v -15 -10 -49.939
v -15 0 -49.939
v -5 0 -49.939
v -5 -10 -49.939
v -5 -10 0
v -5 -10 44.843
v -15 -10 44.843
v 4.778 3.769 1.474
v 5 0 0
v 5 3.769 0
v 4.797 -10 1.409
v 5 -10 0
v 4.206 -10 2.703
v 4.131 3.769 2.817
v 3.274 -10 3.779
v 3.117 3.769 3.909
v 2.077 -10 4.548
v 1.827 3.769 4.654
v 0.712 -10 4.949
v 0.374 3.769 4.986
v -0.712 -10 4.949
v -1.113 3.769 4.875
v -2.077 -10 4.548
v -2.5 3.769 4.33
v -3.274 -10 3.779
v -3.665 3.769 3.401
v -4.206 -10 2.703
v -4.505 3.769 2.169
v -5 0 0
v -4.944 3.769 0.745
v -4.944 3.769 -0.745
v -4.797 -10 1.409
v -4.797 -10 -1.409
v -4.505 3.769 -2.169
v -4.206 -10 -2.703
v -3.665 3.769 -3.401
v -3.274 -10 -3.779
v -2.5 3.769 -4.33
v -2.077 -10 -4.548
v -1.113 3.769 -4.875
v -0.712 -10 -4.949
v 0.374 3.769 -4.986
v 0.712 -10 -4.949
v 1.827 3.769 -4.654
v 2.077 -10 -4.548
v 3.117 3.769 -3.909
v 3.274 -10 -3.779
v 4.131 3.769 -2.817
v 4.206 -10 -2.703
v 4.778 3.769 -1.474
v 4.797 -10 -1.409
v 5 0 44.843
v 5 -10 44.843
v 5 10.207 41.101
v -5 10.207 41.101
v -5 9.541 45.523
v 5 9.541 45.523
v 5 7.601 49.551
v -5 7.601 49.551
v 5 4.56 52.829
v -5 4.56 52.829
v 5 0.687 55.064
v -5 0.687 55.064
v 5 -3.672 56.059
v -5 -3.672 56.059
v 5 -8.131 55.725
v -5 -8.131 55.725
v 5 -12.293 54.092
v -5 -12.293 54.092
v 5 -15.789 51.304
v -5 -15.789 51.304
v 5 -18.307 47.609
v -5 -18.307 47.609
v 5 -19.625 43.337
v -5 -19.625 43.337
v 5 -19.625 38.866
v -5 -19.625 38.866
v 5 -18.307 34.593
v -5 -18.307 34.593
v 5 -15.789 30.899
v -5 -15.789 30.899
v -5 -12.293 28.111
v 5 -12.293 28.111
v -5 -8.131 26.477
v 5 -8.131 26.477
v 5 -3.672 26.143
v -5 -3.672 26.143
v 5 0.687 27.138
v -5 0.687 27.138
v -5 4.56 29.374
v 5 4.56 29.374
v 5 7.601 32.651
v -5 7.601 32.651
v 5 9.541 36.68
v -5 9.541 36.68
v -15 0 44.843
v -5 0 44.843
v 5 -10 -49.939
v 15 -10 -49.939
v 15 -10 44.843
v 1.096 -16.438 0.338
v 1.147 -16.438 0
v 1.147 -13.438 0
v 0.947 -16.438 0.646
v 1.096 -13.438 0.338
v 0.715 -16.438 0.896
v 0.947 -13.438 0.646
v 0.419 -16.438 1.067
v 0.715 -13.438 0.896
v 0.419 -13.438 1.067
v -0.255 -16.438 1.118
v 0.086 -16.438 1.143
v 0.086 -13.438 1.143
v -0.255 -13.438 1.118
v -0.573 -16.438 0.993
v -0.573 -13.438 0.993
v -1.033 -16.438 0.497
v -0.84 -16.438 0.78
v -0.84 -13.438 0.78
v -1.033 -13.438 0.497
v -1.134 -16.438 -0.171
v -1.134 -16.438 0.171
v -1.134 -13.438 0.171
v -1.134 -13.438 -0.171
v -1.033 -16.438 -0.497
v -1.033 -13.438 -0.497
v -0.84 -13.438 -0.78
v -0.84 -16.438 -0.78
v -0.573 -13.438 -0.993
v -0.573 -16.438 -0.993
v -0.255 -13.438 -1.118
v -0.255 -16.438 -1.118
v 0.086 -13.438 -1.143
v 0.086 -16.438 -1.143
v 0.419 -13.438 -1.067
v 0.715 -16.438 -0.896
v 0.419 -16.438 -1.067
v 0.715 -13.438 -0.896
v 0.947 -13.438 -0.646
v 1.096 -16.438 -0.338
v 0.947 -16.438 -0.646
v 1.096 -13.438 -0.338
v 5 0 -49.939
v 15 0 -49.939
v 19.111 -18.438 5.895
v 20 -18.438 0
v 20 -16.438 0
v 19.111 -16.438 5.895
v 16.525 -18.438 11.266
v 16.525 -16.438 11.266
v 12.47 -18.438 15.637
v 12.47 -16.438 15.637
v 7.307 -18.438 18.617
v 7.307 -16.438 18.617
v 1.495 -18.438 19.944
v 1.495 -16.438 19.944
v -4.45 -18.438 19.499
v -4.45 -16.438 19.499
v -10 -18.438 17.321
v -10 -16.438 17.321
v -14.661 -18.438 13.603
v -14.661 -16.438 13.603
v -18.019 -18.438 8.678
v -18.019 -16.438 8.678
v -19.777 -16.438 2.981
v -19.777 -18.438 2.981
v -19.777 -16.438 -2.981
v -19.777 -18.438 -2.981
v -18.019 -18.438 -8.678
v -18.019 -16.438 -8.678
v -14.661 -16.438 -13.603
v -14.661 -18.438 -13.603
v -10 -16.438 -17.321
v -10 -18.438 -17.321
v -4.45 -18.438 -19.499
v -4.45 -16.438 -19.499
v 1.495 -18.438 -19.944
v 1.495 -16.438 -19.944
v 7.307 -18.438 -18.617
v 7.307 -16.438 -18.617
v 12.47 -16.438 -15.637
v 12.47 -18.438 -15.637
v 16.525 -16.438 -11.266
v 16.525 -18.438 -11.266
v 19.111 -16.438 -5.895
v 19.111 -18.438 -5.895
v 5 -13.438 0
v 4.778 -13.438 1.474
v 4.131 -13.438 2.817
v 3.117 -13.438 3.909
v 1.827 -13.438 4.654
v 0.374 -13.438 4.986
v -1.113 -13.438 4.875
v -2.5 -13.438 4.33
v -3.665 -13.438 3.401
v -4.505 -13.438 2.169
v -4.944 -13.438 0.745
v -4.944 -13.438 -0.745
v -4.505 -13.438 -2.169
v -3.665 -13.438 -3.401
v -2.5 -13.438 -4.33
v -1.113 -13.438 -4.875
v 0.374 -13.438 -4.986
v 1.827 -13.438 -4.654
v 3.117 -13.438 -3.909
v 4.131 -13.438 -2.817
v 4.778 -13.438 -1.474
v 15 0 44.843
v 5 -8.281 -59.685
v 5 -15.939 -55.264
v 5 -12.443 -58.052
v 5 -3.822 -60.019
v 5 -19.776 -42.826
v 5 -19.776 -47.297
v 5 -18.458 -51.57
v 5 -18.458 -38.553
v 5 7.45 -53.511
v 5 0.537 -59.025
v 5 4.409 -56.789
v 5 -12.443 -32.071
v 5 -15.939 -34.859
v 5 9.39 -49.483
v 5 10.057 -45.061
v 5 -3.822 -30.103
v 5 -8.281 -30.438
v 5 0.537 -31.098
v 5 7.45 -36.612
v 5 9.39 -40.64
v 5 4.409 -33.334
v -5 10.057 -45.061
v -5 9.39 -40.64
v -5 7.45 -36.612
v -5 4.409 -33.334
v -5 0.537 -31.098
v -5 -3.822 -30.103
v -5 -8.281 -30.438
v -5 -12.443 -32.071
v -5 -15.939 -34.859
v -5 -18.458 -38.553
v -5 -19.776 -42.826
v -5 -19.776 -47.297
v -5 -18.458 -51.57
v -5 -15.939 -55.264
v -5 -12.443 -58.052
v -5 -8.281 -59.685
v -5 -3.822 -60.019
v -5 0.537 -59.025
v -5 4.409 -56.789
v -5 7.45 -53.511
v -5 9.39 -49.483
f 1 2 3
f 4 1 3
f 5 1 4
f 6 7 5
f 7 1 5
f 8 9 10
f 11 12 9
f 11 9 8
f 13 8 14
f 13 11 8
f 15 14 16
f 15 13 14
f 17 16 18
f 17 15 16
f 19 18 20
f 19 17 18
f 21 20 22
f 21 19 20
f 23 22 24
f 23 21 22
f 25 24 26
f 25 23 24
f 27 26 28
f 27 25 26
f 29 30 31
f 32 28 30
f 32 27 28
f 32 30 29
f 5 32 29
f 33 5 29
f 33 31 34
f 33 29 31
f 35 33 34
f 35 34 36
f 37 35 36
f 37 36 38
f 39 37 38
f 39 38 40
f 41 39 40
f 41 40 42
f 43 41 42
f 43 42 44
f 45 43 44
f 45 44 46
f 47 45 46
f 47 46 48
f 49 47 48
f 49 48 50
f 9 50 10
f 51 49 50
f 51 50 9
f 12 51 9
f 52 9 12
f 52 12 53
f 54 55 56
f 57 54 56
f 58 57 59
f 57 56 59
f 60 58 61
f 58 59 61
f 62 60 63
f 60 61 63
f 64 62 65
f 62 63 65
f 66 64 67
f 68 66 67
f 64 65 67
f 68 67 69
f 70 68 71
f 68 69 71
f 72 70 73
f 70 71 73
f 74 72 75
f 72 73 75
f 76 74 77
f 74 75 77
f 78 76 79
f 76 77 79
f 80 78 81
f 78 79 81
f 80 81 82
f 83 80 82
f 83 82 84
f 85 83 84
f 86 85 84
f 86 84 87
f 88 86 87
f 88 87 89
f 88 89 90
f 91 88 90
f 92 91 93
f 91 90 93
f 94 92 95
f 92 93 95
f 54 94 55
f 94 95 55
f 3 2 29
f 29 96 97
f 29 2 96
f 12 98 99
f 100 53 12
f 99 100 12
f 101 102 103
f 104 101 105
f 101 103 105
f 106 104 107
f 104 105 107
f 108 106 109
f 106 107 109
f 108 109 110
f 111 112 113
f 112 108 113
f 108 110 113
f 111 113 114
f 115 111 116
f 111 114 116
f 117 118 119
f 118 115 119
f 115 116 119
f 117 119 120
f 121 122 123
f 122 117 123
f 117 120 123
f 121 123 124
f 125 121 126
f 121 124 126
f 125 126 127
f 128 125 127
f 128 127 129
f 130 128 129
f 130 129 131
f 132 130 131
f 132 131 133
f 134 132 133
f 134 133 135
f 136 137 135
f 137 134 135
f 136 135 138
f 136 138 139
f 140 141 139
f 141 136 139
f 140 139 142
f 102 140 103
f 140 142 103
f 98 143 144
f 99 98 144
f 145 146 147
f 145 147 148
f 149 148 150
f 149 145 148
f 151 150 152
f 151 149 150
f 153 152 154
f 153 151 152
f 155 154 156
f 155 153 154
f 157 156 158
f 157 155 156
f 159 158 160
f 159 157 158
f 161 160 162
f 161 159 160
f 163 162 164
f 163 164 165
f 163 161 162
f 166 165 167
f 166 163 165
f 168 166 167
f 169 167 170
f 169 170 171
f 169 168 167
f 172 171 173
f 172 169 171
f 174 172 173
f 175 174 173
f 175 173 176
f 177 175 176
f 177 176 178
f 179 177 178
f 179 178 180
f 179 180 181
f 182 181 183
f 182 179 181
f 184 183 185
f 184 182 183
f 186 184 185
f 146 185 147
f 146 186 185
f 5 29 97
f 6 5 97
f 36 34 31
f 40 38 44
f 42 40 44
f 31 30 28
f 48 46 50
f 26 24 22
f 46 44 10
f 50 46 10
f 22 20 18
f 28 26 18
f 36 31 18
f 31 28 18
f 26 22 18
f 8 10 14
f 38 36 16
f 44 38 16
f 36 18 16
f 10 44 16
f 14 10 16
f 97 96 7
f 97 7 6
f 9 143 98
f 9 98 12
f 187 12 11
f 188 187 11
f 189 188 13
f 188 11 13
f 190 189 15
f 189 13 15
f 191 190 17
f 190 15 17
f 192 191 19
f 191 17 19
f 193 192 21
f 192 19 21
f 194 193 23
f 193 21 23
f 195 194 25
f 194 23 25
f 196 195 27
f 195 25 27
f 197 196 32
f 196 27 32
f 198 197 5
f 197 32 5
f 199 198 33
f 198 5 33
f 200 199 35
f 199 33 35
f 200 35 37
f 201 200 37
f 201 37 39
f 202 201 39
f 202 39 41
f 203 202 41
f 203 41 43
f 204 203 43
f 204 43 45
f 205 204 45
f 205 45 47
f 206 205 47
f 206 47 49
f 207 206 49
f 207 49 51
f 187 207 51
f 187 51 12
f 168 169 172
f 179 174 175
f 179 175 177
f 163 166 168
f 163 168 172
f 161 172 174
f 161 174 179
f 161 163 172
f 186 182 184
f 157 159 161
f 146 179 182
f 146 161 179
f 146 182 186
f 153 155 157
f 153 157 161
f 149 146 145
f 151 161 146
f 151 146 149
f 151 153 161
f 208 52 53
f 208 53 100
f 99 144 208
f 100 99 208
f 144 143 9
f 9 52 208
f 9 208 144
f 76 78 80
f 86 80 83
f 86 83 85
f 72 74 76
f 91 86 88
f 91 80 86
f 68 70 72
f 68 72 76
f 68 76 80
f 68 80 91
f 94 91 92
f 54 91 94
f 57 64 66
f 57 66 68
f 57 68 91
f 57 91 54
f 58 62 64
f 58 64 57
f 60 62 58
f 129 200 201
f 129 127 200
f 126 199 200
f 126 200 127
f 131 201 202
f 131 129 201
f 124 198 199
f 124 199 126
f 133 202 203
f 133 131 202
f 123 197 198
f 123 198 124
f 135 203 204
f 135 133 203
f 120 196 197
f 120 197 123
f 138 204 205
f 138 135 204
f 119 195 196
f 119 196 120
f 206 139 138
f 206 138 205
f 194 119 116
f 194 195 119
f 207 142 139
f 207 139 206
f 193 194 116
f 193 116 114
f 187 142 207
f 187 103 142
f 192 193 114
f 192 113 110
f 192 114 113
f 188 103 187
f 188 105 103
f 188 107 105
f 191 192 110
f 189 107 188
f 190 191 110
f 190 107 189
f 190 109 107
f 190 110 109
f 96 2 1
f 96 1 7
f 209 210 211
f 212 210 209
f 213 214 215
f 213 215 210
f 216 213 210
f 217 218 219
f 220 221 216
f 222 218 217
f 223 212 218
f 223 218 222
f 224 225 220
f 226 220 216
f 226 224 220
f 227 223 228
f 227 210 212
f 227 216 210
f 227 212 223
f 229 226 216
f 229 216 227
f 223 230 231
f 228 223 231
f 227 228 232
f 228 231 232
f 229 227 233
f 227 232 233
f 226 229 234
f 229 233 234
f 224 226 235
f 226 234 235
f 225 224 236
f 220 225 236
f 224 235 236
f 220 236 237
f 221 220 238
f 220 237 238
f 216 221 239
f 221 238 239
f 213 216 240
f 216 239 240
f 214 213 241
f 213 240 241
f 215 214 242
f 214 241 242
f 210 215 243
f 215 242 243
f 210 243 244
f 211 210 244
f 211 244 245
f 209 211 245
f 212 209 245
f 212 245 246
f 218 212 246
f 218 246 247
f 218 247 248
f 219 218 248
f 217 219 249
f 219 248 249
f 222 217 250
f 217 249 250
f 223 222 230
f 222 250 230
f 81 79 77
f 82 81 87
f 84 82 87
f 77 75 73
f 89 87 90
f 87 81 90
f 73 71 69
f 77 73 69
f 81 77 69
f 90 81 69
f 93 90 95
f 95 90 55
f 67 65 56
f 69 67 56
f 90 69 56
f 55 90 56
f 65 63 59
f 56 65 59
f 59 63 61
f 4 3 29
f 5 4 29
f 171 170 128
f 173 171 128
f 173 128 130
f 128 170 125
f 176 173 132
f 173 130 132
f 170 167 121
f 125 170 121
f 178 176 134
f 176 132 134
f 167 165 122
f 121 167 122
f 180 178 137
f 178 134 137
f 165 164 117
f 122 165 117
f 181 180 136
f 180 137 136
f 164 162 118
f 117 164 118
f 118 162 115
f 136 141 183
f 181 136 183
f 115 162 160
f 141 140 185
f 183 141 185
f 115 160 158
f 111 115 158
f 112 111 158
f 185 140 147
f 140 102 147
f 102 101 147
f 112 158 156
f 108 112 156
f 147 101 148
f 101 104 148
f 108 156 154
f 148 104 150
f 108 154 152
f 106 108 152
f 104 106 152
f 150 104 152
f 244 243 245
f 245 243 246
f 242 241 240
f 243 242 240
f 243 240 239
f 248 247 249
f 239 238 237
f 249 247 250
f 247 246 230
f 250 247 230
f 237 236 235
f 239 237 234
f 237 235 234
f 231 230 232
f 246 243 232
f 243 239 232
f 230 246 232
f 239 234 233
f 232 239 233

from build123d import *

# Parameters (mm, degrees)
F0_W      = 10
F0_H      = 94.782337
F1_DEPTH  = 10
F2_R      = 15
F3_DEPTH  = 10
F4_R      = 5
F5_DEPTH  = 13.768665
F5_FACE_R = 5
F6_DEPTH  = 3.437768
F7_R      = 1.146529
F8_DEPTH  = 5
F9_R      = 20
F10_DEPTH = 2


with BuildPart() as f1:
    # F0 (on Front) → F1 (new body)
    with BuildSketch(Plane.XZ):
        with Locations((10, -2.548195)):
            Rectangle(F0_W, F0_H)
        with Locations((-10, -2.548195)):
            Rectangle(F0_W, F0_H)
    extrude(amount=F1_DEPTH)



with BuildPart() as f3:
    # F2 (on face) → F3 (new body)
    with BuildSketch(Plane.YZ.offset(-5)):
        with Locations((-4.94337, -45.061424)):
            Circle(F2_R)
        with Locations((-4.792805, 41.101221)):
            Circle(F2_R)
    extrude(amount=F3_DEPTH)


with BuildPart() as f5:
    # F4 (on face) → F5 (new body)
    with BuildSketch(Plane.XZ.offset(10)):
        Circle(F4_R)
    extrude(amount=-F5_DEPTH)


with BuildPart() as f1_1:
    add(f1.part)

    add(f5.part)  # F6 merges F5
    # F5_face (on face) → F6 (join)
    with BuildSketch(Plane.XZ.offset(10)):
        Circle(F5_FACE_R)
    extrude(amount=F6_DEPTH)

    # F7 (on face) → F8 (join)
    with BuildSketch(Plane.XZ.offset(13.437768)):
        Circle(F7_R)
    extrude(amount=F8_DEPTH)

    # F9 (on face) → F10 (join)
    with BuildSketch(Plane.XZ.offset(18.437768)):
        Circle(F9_R)
    extrude(amount=-F10_DEPTH)


solid = Compound([f3.part, f1_1.part])
